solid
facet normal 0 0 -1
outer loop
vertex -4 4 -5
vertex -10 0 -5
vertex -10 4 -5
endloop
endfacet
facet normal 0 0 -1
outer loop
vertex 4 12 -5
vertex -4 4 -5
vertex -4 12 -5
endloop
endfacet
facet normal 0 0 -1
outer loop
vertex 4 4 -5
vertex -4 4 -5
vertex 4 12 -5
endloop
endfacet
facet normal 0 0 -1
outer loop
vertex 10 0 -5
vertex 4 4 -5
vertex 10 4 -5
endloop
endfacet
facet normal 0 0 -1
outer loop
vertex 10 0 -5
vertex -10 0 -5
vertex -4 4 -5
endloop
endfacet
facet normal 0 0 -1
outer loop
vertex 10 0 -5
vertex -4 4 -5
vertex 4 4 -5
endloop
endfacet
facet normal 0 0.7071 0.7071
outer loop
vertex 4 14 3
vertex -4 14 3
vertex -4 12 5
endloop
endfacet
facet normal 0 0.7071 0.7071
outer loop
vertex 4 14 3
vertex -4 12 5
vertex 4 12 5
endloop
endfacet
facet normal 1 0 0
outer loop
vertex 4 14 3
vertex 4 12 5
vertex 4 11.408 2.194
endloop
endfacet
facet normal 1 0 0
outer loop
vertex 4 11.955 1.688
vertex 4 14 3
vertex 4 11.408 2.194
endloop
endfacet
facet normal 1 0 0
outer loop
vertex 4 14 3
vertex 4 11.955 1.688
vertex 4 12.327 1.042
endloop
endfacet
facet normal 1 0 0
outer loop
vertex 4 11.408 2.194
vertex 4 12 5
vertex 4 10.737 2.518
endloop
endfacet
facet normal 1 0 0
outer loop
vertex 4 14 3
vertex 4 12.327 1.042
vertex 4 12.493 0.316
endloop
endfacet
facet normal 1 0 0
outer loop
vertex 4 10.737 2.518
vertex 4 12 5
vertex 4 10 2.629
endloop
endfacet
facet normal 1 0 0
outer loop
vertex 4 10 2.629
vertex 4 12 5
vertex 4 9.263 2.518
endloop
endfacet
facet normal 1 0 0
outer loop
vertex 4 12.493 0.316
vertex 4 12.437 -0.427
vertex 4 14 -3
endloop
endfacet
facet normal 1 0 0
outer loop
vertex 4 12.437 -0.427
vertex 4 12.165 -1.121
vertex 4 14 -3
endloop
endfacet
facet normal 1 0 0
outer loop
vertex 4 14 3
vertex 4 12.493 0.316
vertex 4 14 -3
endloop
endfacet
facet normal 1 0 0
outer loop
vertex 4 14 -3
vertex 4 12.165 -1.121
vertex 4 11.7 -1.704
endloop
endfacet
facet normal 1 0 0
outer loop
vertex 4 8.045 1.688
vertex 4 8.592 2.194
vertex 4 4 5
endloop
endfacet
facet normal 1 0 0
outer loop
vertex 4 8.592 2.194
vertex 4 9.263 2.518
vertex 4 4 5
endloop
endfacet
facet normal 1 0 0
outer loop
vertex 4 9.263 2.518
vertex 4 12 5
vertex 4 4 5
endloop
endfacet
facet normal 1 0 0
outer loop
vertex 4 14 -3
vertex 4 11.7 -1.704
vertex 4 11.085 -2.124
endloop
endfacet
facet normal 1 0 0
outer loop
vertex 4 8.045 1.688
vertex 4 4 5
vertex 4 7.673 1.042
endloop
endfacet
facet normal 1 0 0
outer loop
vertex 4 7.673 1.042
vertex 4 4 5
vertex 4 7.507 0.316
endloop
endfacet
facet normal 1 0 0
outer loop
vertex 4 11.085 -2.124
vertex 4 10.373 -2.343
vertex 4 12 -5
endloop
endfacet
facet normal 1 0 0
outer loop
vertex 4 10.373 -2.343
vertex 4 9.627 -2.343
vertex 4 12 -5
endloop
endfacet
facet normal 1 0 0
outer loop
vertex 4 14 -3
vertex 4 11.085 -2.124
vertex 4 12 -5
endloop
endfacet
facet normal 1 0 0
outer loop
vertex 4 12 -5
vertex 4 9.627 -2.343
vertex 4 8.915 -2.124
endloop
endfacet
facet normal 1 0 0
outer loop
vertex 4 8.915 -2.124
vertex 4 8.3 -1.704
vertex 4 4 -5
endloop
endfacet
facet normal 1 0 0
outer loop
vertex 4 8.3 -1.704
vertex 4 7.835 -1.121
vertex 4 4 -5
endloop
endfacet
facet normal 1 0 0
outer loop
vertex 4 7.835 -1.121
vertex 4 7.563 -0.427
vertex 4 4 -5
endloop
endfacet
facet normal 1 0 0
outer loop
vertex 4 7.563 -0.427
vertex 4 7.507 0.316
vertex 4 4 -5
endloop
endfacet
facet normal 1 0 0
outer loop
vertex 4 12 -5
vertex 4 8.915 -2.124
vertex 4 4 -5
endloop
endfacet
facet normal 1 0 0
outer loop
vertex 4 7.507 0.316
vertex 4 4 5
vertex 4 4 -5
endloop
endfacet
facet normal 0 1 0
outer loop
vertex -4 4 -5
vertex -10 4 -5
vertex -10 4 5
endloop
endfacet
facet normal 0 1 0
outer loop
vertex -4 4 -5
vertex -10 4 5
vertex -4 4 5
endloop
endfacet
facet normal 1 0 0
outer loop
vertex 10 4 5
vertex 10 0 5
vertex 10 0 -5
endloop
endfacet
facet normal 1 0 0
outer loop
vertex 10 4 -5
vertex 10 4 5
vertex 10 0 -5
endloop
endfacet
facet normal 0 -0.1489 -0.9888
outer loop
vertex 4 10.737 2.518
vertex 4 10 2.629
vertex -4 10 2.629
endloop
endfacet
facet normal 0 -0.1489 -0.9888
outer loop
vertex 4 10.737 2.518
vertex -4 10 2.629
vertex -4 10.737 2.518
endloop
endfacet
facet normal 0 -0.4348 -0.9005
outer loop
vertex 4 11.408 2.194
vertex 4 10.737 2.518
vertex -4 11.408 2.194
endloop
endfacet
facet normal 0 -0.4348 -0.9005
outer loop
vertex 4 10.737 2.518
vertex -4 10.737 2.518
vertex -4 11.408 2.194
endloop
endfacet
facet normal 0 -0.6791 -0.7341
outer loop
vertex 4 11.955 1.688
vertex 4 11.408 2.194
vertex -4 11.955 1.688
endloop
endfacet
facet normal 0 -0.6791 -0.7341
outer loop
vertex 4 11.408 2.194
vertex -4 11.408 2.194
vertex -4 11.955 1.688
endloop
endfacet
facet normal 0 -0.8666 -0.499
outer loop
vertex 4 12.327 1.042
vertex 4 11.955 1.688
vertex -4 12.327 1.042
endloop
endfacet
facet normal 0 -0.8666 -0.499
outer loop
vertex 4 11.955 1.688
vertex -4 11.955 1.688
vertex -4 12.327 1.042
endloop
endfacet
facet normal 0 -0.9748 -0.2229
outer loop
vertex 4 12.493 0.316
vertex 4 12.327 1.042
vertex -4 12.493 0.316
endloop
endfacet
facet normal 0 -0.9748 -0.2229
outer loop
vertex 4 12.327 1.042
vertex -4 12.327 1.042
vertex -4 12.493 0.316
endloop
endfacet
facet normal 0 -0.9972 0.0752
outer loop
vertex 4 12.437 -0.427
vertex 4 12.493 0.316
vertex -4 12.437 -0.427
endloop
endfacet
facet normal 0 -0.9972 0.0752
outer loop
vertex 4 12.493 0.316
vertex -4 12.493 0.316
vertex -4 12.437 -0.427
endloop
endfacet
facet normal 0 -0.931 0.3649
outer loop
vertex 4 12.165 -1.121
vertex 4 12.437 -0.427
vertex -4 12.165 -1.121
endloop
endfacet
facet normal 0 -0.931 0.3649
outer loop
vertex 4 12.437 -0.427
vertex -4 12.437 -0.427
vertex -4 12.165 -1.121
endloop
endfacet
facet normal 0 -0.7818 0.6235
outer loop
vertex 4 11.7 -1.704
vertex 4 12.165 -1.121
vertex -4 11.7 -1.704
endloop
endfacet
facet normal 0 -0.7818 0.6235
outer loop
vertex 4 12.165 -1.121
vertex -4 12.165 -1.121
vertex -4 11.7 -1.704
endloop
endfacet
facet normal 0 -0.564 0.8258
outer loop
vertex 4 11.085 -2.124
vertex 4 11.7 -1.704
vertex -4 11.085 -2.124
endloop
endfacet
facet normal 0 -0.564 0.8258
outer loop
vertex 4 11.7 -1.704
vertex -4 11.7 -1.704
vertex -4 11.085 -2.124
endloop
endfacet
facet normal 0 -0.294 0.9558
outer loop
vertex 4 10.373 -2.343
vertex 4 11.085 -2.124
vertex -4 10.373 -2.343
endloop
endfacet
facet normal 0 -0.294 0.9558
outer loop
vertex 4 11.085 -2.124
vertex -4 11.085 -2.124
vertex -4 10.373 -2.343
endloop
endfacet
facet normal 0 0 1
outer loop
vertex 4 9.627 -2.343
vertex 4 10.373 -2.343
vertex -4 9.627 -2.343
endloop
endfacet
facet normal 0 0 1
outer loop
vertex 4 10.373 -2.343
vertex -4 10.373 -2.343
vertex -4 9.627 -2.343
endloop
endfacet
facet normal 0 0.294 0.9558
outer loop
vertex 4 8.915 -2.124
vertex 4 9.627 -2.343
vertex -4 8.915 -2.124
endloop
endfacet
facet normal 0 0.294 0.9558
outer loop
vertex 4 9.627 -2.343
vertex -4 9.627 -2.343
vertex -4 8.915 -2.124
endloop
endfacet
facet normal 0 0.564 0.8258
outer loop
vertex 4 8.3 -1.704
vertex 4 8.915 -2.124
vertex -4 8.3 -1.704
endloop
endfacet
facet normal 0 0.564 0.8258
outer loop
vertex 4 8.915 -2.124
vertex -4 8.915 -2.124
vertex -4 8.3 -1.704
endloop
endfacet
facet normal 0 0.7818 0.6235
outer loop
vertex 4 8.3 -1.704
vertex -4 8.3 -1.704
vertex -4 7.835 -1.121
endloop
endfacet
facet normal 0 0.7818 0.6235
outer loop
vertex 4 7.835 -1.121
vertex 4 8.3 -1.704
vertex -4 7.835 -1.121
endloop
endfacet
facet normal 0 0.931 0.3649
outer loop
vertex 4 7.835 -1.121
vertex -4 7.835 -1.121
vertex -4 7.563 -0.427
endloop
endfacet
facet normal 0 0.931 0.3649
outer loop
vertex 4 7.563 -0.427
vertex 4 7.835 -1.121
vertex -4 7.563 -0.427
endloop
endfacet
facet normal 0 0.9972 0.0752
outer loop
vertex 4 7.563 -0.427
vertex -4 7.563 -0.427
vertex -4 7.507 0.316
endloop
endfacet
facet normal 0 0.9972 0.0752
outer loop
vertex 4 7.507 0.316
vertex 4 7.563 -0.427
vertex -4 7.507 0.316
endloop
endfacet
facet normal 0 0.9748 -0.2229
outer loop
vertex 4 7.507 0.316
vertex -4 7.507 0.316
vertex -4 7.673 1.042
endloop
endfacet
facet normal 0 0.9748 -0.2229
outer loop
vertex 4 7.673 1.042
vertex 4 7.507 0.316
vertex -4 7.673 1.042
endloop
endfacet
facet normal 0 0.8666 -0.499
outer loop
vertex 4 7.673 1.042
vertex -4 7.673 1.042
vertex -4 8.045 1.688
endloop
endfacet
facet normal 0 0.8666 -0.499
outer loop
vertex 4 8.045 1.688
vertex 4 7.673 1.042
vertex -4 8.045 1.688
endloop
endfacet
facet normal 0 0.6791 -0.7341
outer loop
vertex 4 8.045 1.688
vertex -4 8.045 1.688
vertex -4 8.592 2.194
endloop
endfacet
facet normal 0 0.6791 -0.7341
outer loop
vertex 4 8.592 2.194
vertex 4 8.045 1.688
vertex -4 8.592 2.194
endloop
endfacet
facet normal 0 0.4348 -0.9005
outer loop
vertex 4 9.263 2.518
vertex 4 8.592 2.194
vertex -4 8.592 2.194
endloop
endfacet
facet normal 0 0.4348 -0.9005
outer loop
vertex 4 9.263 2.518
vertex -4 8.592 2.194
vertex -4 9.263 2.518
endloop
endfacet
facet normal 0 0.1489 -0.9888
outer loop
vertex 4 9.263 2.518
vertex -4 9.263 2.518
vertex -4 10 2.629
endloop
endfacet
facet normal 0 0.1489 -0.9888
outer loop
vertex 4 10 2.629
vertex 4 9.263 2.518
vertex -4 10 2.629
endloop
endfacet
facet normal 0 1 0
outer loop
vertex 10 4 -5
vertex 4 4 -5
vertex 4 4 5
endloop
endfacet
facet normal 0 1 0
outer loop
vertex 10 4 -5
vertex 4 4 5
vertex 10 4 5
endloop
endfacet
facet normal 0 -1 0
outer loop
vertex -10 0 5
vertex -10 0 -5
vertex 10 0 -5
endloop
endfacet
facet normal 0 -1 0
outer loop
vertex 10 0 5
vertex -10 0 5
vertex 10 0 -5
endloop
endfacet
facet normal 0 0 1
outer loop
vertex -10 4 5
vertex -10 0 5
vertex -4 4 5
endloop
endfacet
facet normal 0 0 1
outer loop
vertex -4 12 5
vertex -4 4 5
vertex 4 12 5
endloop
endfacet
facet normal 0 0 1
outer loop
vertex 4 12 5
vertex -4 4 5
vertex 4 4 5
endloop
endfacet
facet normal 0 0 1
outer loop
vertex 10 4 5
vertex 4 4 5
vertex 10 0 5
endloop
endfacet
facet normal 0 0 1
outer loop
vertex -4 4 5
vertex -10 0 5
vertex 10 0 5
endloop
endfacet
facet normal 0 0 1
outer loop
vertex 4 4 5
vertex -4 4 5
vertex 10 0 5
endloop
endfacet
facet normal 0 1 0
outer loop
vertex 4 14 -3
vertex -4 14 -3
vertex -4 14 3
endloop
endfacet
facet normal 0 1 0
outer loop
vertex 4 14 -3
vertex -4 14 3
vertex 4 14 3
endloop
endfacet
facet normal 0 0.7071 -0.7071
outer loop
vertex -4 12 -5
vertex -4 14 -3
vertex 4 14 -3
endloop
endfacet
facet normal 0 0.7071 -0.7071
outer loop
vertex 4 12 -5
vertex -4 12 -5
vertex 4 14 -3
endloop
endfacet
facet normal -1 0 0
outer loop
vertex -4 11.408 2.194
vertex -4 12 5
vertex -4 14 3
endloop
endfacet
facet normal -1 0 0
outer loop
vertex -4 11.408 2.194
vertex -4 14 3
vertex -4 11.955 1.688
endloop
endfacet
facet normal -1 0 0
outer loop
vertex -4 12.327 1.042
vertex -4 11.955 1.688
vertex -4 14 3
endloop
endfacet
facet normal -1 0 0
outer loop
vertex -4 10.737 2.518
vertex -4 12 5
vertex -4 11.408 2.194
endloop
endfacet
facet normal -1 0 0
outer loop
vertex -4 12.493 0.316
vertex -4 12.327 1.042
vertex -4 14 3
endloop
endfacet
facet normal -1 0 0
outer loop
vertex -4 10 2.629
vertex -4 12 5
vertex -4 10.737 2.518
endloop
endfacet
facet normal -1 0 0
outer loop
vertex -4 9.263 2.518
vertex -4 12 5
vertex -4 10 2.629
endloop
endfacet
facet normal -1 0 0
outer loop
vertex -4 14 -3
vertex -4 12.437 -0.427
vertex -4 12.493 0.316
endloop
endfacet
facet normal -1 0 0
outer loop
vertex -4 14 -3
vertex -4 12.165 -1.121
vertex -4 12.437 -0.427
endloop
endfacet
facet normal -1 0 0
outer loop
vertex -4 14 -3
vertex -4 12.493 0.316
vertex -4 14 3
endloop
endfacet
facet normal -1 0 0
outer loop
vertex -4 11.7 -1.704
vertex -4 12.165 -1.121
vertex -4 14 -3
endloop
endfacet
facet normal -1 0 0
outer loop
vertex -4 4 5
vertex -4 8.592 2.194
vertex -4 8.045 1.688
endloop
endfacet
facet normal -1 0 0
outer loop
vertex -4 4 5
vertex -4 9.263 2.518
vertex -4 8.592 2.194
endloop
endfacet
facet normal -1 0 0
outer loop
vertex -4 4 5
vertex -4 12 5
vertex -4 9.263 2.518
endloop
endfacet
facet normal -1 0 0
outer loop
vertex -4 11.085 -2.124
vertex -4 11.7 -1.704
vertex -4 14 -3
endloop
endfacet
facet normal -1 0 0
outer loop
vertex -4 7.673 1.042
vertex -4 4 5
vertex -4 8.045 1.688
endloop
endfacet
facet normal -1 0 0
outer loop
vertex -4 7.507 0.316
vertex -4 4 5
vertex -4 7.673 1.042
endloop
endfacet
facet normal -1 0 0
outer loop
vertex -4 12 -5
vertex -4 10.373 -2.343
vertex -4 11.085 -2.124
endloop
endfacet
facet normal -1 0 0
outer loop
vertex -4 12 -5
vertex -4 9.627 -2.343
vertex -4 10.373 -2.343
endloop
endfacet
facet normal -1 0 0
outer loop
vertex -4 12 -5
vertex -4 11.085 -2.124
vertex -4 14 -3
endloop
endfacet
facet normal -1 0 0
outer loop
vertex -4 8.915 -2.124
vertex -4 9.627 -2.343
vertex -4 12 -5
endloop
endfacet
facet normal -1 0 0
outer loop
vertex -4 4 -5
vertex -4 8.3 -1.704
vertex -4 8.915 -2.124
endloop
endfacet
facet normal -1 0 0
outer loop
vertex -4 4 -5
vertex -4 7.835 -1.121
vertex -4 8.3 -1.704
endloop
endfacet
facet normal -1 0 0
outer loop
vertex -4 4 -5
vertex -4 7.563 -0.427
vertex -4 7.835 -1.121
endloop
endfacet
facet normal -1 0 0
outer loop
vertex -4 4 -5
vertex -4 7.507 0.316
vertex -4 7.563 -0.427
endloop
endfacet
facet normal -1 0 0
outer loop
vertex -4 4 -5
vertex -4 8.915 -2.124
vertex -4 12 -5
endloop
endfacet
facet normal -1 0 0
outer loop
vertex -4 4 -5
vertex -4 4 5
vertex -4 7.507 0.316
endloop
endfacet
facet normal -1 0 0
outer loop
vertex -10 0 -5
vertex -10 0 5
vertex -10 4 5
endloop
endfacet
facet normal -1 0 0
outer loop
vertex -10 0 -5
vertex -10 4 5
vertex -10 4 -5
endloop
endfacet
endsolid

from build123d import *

# Parameters (mm, degrees)
SKETCH_1_W          = 20
SKETCH_1_H          = 10
EXTRUDE_1_DEPTH     = 4
SKETCH_2_W          = 8
SKETCH_2_H          = 10
EXTRUDE_2_DEPTH     = 10
SKETCH_3_R          = 2.499995339
CUT_EXTRUDE_1_DEPTH = 21.420577857
CHAMFER_1_SIZE      = 2


with BuildPart() as part:
    # Эскиз1 → Вытянуть1 (new body)
    with BuildSketch(Plane(origin=(0, 0, 0), x_dir=(1, 0, 0), z_dir=(0, 1, 0))):
        Rectangle(SKETCH_1_W, SKETCH_1_H)
    extrude(amount=EXTRUDE_1_DEPTH)

    # Эскиз2 → Вытянуть2 (add)
    with BuildSketch(Plane(origin=(0, 4, 0), x_dir=(1, 0, 0), z_dir=(0, 1, 0))):
        Rectangle(SKETCH_2_W, SKETCH_2_H)
    extrude(amount=EXTRUDE_2_DEPTH)

    # Эскиз3 → Вырез-Вытянуть1 (cut, through all)
    with BuildSketch(Plane.ZY.offset(4)):
        with Locations((0.128840194, 10)):
            Circle(SKETCH_3_R)
    extrude(amount=-CUT_EXTRUDE_1_DEPTH, mode=Mode.SUBTRACT)

    # Фаска1
    chamfer_1_edges = [part.edges().sort_by_distance(p)[0] for p in [
        (0, 14, -5),
        (0, 14, 5),
    ]]
    chamfer(chamfer_1_edges, length=CHAMFER_1_SIZE)


solid = part.part
